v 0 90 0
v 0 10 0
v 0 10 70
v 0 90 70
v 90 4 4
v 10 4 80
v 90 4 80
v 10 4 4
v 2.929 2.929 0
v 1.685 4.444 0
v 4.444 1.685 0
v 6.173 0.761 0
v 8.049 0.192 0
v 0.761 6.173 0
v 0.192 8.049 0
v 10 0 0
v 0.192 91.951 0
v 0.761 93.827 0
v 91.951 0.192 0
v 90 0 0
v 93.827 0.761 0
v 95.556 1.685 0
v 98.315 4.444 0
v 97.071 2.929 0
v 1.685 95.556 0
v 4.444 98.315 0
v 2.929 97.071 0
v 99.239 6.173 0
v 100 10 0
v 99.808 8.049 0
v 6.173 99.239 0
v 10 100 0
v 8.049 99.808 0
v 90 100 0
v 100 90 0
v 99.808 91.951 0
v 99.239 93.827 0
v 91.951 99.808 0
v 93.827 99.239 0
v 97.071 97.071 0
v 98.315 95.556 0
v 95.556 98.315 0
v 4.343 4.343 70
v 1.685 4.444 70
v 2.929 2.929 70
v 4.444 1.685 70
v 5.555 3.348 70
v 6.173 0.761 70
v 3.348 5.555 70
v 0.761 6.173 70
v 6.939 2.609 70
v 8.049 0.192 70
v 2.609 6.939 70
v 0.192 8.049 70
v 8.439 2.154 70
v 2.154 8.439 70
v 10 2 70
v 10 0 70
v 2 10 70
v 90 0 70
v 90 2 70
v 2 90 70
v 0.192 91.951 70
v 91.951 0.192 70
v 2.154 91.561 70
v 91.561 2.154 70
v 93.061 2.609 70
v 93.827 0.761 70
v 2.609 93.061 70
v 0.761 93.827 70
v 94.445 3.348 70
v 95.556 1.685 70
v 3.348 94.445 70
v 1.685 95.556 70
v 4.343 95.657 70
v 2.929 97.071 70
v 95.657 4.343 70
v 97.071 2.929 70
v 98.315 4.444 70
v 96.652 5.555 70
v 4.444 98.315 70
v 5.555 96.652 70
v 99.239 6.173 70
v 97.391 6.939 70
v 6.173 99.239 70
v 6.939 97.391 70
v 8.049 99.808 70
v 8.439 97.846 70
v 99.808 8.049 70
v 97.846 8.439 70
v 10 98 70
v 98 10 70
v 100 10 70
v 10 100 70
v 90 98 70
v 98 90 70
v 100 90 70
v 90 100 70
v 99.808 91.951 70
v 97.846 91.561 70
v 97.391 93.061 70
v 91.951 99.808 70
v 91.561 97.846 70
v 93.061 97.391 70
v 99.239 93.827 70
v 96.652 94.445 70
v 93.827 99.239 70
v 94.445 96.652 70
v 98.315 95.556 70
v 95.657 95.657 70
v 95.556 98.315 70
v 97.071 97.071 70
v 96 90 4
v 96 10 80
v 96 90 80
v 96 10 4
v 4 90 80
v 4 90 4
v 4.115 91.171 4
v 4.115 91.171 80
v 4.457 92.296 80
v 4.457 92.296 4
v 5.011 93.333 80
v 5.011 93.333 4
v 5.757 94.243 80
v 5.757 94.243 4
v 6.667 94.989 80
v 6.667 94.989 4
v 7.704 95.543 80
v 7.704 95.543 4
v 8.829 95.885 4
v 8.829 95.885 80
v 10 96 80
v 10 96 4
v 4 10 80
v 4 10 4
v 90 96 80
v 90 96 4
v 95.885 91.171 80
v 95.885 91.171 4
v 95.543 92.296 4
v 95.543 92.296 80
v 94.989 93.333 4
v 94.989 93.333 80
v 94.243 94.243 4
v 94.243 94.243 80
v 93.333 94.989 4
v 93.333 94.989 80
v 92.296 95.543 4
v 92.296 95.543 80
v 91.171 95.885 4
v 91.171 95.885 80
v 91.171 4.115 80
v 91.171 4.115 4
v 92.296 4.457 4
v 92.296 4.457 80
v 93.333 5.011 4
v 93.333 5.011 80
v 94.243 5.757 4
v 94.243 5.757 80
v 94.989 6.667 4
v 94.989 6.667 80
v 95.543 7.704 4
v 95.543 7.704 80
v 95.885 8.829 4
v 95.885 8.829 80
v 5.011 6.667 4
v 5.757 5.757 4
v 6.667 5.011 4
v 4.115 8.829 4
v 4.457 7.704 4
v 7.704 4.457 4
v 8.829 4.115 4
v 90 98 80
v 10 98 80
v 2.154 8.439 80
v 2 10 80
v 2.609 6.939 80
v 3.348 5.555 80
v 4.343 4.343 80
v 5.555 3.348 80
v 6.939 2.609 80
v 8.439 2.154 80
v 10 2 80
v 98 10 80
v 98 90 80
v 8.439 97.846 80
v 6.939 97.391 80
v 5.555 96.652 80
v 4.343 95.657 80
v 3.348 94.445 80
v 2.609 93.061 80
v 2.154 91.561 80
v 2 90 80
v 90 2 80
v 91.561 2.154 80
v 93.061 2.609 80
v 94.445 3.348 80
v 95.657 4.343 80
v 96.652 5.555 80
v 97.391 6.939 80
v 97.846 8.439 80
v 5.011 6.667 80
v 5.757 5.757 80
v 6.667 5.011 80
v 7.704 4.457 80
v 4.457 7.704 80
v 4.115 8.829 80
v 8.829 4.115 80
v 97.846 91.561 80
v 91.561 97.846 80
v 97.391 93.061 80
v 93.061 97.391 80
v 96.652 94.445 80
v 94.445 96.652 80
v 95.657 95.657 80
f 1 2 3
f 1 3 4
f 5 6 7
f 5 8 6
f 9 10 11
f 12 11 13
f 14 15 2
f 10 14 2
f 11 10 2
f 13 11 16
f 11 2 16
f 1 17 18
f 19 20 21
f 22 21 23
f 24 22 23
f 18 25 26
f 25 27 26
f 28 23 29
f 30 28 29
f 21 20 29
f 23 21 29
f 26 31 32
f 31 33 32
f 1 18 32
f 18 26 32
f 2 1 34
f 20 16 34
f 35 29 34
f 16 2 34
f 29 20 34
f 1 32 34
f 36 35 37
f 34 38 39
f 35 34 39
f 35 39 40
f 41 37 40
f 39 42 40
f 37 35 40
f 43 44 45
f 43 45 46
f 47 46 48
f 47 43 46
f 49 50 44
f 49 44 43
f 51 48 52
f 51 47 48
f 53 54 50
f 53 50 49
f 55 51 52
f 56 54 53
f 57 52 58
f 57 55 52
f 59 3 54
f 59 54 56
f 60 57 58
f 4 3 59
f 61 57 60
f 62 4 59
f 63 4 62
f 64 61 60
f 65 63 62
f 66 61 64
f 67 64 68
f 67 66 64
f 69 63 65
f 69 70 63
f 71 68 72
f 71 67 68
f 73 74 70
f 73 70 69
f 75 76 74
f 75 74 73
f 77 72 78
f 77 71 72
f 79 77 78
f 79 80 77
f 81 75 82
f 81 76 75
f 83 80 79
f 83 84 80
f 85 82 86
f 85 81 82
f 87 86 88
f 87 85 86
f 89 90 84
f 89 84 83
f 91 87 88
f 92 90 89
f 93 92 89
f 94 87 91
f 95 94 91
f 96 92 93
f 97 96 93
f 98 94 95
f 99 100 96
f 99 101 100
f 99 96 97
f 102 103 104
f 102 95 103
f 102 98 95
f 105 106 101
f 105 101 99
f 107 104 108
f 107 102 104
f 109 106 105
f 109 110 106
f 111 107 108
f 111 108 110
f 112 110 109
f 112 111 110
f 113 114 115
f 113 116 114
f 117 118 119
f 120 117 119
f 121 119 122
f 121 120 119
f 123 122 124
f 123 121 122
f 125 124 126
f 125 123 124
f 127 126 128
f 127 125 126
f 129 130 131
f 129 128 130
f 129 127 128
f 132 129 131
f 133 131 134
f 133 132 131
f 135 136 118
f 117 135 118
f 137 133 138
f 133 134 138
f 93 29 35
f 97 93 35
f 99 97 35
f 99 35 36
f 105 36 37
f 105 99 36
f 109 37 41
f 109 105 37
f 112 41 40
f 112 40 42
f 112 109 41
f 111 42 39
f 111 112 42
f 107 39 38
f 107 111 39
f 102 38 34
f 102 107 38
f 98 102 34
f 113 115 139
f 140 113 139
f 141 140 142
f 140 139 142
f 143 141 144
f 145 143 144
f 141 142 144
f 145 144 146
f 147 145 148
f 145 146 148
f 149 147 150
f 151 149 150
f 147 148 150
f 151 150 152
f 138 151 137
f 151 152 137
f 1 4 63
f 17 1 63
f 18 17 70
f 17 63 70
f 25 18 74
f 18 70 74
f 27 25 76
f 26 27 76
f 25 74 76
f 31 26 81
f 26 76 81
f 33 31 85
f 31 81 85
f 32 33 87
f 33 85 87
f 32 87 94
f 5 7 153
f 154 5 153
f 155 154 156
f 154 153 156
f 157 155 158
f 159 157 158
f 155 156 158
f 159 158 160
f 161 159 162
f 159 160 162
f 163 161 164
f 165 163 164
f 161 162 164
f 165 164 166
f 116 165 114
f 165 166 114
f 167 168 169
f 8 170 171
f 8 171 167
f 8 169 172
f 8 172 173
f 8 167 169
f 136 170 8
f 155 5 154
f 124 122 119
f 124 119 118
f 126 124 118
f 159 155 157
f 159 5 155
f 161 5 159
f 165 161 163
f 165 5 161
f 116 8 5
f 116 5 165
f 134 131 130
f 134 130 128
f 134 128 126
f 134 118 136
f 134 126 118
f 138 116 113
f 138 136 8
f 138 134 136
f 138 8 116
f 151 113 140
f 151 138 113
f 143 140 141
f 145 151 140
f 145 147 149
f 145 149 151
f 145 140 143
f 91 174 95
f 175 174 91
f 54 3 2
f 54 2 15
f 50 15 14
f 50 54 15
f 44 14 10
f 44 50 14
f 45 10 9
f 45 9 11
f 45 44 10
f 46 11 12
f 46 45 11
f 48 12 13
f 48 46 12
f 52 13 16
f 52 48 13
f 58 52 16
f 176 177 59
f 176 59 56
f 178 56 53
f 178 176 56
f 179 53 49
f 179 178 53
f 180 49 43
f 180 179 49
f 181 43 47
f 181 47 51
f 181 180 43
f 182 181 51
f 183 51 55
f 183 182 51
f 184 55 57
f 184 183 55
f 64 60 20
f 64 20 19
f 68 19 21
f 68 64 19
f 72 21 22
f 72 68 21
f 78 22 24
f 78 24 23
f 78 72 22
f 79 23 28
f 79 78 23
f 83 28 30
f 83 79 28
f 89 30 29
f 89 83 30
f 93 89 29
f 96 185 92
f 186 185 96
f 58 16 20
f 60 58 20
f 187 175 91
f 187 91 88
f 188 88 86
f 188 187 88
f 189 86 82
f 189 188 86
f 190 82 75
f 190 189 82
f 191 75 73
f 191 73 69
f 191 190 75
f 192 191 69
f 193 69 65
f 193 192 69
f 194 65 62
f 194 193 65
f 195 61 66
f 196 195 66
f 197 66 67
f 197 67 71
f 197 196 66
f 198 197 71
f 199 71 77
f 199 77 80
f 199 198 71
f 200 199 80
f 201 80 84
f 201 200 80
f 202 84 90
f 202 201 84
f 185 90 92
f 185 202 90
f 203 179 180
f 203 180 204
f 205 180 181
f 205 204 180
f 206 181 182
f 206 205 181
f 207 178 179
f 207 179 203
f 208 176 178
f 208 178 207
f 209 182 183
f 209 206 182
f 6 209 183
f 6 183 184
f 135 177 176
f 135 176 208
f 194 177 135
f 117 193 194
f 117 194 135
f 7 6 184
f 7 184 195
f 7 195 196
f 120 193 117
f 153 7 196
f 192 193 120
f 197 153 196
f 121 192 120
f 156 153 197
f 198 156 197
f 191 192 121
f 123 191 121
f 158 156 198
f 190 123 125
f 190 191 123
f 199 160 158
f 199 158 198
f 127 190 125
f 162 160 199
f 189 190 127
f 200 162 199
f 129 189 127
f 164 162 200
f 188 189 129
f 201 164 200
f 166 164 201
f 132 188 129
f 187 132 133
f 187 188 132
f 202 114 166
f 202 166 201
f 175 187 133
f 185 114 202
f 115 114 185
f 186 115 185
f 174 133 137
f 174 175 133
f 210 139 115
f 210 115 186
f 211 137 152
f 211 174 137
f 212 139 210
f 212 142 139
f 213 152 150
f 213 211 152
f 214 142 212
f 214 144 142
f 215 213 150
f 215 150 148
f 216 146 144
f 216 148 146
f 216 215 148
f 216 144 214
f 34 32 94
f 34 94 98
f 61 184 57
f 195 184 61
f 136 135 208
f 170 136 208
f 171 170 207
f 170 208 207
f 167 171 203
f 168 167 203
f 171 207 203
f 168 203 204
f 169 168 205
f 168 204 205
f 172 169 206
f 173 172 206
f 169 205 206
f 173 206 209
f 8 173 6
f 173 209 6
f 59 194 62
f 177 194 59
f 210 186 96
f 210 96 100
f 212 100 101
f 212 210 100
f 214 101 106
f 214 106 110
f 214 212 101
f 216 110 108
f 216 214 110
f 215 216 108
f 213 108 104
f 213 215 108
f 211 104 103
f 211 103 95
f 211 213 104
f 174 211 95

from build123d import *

# Parameters (mm, degrees)
SKETCH_W     = 100
SKETCH_H     = 100
PAD_DEPTH    = 80
FILLET_R     = 10
THICKNESS_T  = -4
POCKET_DEPTH = 10


with BuildPart() as part:
    # Sketch → Pad (new body)
    with BuildSketch(Plane.XY):
        with Locations((50, 50)):
            Rectangle(SKETCH_W, SKETCH_H)
    extrude(amount=PAD_DEPTH)

    # Fillet
    fillet_edges = [part.edges().sort_by_distance(p)[0] for p in [
        (0, 0, 40),
        (100, 0, 40),
        (100, 100, 40),
        (0, 100, 40),
    ]]
    fillet(fillet_edges, radius=FILLET_R)

    # Thickness
    thickness_openings = [part.faces().sort_by_distance(p)[0] for p in [
        (50, 50, 80),
    ]]
    offset(amount=THICKNESS_T, openings=thickness_openings, kind=Kind.INTERSECTION)

    # Sketch001 (on Face10 of Thickness) → Pocket (cut)
    with BuildSketch(Plane.XY.offset(80)):
        with BuildLine():
            Line((0, 90), (0, 10))
            ThreePointArc((0, 10), (2.928932, 2.928932), (10, 0))
            Line((10, 0), (90, 0))
            ThreePointArc((90, 0), (97.071068, 2.928932), (100, 10))
            Line((100, 10), (100, 90))
            ThreePointArc((100, 90), (97.071068, 97.071068), (90, 100))
            Line((90, 100), (10, 100))
            ThreePointArc((10, 100), (2.928932, 97.071068), (0, 90))
        make_face()
        with BuildLine():
            Line((2, 90), (2, 10))
            ThreePointArc((2, 10), (4.343146, 4.343146), (10, 2))
            Line((10, 2), (90, 2))
            ThreePointArc((90, 2), (95.656854, 4.343146), (98, 10))
            Line((98, 10), (98, 90))
            ThreePointArc((98, 90), (95.656854, 95.656854), (90, 98))
            Line((90, 98), (10, 98))
            ThreePointArc((10, 98), (4.343146, 95.656854), (2, 90))
        make_face(mode=Mode.SUBTRACT)
    extrude(amount=-POCKET_DEPTH, mode=Mode.SUBTRACT)


solid = part.part
